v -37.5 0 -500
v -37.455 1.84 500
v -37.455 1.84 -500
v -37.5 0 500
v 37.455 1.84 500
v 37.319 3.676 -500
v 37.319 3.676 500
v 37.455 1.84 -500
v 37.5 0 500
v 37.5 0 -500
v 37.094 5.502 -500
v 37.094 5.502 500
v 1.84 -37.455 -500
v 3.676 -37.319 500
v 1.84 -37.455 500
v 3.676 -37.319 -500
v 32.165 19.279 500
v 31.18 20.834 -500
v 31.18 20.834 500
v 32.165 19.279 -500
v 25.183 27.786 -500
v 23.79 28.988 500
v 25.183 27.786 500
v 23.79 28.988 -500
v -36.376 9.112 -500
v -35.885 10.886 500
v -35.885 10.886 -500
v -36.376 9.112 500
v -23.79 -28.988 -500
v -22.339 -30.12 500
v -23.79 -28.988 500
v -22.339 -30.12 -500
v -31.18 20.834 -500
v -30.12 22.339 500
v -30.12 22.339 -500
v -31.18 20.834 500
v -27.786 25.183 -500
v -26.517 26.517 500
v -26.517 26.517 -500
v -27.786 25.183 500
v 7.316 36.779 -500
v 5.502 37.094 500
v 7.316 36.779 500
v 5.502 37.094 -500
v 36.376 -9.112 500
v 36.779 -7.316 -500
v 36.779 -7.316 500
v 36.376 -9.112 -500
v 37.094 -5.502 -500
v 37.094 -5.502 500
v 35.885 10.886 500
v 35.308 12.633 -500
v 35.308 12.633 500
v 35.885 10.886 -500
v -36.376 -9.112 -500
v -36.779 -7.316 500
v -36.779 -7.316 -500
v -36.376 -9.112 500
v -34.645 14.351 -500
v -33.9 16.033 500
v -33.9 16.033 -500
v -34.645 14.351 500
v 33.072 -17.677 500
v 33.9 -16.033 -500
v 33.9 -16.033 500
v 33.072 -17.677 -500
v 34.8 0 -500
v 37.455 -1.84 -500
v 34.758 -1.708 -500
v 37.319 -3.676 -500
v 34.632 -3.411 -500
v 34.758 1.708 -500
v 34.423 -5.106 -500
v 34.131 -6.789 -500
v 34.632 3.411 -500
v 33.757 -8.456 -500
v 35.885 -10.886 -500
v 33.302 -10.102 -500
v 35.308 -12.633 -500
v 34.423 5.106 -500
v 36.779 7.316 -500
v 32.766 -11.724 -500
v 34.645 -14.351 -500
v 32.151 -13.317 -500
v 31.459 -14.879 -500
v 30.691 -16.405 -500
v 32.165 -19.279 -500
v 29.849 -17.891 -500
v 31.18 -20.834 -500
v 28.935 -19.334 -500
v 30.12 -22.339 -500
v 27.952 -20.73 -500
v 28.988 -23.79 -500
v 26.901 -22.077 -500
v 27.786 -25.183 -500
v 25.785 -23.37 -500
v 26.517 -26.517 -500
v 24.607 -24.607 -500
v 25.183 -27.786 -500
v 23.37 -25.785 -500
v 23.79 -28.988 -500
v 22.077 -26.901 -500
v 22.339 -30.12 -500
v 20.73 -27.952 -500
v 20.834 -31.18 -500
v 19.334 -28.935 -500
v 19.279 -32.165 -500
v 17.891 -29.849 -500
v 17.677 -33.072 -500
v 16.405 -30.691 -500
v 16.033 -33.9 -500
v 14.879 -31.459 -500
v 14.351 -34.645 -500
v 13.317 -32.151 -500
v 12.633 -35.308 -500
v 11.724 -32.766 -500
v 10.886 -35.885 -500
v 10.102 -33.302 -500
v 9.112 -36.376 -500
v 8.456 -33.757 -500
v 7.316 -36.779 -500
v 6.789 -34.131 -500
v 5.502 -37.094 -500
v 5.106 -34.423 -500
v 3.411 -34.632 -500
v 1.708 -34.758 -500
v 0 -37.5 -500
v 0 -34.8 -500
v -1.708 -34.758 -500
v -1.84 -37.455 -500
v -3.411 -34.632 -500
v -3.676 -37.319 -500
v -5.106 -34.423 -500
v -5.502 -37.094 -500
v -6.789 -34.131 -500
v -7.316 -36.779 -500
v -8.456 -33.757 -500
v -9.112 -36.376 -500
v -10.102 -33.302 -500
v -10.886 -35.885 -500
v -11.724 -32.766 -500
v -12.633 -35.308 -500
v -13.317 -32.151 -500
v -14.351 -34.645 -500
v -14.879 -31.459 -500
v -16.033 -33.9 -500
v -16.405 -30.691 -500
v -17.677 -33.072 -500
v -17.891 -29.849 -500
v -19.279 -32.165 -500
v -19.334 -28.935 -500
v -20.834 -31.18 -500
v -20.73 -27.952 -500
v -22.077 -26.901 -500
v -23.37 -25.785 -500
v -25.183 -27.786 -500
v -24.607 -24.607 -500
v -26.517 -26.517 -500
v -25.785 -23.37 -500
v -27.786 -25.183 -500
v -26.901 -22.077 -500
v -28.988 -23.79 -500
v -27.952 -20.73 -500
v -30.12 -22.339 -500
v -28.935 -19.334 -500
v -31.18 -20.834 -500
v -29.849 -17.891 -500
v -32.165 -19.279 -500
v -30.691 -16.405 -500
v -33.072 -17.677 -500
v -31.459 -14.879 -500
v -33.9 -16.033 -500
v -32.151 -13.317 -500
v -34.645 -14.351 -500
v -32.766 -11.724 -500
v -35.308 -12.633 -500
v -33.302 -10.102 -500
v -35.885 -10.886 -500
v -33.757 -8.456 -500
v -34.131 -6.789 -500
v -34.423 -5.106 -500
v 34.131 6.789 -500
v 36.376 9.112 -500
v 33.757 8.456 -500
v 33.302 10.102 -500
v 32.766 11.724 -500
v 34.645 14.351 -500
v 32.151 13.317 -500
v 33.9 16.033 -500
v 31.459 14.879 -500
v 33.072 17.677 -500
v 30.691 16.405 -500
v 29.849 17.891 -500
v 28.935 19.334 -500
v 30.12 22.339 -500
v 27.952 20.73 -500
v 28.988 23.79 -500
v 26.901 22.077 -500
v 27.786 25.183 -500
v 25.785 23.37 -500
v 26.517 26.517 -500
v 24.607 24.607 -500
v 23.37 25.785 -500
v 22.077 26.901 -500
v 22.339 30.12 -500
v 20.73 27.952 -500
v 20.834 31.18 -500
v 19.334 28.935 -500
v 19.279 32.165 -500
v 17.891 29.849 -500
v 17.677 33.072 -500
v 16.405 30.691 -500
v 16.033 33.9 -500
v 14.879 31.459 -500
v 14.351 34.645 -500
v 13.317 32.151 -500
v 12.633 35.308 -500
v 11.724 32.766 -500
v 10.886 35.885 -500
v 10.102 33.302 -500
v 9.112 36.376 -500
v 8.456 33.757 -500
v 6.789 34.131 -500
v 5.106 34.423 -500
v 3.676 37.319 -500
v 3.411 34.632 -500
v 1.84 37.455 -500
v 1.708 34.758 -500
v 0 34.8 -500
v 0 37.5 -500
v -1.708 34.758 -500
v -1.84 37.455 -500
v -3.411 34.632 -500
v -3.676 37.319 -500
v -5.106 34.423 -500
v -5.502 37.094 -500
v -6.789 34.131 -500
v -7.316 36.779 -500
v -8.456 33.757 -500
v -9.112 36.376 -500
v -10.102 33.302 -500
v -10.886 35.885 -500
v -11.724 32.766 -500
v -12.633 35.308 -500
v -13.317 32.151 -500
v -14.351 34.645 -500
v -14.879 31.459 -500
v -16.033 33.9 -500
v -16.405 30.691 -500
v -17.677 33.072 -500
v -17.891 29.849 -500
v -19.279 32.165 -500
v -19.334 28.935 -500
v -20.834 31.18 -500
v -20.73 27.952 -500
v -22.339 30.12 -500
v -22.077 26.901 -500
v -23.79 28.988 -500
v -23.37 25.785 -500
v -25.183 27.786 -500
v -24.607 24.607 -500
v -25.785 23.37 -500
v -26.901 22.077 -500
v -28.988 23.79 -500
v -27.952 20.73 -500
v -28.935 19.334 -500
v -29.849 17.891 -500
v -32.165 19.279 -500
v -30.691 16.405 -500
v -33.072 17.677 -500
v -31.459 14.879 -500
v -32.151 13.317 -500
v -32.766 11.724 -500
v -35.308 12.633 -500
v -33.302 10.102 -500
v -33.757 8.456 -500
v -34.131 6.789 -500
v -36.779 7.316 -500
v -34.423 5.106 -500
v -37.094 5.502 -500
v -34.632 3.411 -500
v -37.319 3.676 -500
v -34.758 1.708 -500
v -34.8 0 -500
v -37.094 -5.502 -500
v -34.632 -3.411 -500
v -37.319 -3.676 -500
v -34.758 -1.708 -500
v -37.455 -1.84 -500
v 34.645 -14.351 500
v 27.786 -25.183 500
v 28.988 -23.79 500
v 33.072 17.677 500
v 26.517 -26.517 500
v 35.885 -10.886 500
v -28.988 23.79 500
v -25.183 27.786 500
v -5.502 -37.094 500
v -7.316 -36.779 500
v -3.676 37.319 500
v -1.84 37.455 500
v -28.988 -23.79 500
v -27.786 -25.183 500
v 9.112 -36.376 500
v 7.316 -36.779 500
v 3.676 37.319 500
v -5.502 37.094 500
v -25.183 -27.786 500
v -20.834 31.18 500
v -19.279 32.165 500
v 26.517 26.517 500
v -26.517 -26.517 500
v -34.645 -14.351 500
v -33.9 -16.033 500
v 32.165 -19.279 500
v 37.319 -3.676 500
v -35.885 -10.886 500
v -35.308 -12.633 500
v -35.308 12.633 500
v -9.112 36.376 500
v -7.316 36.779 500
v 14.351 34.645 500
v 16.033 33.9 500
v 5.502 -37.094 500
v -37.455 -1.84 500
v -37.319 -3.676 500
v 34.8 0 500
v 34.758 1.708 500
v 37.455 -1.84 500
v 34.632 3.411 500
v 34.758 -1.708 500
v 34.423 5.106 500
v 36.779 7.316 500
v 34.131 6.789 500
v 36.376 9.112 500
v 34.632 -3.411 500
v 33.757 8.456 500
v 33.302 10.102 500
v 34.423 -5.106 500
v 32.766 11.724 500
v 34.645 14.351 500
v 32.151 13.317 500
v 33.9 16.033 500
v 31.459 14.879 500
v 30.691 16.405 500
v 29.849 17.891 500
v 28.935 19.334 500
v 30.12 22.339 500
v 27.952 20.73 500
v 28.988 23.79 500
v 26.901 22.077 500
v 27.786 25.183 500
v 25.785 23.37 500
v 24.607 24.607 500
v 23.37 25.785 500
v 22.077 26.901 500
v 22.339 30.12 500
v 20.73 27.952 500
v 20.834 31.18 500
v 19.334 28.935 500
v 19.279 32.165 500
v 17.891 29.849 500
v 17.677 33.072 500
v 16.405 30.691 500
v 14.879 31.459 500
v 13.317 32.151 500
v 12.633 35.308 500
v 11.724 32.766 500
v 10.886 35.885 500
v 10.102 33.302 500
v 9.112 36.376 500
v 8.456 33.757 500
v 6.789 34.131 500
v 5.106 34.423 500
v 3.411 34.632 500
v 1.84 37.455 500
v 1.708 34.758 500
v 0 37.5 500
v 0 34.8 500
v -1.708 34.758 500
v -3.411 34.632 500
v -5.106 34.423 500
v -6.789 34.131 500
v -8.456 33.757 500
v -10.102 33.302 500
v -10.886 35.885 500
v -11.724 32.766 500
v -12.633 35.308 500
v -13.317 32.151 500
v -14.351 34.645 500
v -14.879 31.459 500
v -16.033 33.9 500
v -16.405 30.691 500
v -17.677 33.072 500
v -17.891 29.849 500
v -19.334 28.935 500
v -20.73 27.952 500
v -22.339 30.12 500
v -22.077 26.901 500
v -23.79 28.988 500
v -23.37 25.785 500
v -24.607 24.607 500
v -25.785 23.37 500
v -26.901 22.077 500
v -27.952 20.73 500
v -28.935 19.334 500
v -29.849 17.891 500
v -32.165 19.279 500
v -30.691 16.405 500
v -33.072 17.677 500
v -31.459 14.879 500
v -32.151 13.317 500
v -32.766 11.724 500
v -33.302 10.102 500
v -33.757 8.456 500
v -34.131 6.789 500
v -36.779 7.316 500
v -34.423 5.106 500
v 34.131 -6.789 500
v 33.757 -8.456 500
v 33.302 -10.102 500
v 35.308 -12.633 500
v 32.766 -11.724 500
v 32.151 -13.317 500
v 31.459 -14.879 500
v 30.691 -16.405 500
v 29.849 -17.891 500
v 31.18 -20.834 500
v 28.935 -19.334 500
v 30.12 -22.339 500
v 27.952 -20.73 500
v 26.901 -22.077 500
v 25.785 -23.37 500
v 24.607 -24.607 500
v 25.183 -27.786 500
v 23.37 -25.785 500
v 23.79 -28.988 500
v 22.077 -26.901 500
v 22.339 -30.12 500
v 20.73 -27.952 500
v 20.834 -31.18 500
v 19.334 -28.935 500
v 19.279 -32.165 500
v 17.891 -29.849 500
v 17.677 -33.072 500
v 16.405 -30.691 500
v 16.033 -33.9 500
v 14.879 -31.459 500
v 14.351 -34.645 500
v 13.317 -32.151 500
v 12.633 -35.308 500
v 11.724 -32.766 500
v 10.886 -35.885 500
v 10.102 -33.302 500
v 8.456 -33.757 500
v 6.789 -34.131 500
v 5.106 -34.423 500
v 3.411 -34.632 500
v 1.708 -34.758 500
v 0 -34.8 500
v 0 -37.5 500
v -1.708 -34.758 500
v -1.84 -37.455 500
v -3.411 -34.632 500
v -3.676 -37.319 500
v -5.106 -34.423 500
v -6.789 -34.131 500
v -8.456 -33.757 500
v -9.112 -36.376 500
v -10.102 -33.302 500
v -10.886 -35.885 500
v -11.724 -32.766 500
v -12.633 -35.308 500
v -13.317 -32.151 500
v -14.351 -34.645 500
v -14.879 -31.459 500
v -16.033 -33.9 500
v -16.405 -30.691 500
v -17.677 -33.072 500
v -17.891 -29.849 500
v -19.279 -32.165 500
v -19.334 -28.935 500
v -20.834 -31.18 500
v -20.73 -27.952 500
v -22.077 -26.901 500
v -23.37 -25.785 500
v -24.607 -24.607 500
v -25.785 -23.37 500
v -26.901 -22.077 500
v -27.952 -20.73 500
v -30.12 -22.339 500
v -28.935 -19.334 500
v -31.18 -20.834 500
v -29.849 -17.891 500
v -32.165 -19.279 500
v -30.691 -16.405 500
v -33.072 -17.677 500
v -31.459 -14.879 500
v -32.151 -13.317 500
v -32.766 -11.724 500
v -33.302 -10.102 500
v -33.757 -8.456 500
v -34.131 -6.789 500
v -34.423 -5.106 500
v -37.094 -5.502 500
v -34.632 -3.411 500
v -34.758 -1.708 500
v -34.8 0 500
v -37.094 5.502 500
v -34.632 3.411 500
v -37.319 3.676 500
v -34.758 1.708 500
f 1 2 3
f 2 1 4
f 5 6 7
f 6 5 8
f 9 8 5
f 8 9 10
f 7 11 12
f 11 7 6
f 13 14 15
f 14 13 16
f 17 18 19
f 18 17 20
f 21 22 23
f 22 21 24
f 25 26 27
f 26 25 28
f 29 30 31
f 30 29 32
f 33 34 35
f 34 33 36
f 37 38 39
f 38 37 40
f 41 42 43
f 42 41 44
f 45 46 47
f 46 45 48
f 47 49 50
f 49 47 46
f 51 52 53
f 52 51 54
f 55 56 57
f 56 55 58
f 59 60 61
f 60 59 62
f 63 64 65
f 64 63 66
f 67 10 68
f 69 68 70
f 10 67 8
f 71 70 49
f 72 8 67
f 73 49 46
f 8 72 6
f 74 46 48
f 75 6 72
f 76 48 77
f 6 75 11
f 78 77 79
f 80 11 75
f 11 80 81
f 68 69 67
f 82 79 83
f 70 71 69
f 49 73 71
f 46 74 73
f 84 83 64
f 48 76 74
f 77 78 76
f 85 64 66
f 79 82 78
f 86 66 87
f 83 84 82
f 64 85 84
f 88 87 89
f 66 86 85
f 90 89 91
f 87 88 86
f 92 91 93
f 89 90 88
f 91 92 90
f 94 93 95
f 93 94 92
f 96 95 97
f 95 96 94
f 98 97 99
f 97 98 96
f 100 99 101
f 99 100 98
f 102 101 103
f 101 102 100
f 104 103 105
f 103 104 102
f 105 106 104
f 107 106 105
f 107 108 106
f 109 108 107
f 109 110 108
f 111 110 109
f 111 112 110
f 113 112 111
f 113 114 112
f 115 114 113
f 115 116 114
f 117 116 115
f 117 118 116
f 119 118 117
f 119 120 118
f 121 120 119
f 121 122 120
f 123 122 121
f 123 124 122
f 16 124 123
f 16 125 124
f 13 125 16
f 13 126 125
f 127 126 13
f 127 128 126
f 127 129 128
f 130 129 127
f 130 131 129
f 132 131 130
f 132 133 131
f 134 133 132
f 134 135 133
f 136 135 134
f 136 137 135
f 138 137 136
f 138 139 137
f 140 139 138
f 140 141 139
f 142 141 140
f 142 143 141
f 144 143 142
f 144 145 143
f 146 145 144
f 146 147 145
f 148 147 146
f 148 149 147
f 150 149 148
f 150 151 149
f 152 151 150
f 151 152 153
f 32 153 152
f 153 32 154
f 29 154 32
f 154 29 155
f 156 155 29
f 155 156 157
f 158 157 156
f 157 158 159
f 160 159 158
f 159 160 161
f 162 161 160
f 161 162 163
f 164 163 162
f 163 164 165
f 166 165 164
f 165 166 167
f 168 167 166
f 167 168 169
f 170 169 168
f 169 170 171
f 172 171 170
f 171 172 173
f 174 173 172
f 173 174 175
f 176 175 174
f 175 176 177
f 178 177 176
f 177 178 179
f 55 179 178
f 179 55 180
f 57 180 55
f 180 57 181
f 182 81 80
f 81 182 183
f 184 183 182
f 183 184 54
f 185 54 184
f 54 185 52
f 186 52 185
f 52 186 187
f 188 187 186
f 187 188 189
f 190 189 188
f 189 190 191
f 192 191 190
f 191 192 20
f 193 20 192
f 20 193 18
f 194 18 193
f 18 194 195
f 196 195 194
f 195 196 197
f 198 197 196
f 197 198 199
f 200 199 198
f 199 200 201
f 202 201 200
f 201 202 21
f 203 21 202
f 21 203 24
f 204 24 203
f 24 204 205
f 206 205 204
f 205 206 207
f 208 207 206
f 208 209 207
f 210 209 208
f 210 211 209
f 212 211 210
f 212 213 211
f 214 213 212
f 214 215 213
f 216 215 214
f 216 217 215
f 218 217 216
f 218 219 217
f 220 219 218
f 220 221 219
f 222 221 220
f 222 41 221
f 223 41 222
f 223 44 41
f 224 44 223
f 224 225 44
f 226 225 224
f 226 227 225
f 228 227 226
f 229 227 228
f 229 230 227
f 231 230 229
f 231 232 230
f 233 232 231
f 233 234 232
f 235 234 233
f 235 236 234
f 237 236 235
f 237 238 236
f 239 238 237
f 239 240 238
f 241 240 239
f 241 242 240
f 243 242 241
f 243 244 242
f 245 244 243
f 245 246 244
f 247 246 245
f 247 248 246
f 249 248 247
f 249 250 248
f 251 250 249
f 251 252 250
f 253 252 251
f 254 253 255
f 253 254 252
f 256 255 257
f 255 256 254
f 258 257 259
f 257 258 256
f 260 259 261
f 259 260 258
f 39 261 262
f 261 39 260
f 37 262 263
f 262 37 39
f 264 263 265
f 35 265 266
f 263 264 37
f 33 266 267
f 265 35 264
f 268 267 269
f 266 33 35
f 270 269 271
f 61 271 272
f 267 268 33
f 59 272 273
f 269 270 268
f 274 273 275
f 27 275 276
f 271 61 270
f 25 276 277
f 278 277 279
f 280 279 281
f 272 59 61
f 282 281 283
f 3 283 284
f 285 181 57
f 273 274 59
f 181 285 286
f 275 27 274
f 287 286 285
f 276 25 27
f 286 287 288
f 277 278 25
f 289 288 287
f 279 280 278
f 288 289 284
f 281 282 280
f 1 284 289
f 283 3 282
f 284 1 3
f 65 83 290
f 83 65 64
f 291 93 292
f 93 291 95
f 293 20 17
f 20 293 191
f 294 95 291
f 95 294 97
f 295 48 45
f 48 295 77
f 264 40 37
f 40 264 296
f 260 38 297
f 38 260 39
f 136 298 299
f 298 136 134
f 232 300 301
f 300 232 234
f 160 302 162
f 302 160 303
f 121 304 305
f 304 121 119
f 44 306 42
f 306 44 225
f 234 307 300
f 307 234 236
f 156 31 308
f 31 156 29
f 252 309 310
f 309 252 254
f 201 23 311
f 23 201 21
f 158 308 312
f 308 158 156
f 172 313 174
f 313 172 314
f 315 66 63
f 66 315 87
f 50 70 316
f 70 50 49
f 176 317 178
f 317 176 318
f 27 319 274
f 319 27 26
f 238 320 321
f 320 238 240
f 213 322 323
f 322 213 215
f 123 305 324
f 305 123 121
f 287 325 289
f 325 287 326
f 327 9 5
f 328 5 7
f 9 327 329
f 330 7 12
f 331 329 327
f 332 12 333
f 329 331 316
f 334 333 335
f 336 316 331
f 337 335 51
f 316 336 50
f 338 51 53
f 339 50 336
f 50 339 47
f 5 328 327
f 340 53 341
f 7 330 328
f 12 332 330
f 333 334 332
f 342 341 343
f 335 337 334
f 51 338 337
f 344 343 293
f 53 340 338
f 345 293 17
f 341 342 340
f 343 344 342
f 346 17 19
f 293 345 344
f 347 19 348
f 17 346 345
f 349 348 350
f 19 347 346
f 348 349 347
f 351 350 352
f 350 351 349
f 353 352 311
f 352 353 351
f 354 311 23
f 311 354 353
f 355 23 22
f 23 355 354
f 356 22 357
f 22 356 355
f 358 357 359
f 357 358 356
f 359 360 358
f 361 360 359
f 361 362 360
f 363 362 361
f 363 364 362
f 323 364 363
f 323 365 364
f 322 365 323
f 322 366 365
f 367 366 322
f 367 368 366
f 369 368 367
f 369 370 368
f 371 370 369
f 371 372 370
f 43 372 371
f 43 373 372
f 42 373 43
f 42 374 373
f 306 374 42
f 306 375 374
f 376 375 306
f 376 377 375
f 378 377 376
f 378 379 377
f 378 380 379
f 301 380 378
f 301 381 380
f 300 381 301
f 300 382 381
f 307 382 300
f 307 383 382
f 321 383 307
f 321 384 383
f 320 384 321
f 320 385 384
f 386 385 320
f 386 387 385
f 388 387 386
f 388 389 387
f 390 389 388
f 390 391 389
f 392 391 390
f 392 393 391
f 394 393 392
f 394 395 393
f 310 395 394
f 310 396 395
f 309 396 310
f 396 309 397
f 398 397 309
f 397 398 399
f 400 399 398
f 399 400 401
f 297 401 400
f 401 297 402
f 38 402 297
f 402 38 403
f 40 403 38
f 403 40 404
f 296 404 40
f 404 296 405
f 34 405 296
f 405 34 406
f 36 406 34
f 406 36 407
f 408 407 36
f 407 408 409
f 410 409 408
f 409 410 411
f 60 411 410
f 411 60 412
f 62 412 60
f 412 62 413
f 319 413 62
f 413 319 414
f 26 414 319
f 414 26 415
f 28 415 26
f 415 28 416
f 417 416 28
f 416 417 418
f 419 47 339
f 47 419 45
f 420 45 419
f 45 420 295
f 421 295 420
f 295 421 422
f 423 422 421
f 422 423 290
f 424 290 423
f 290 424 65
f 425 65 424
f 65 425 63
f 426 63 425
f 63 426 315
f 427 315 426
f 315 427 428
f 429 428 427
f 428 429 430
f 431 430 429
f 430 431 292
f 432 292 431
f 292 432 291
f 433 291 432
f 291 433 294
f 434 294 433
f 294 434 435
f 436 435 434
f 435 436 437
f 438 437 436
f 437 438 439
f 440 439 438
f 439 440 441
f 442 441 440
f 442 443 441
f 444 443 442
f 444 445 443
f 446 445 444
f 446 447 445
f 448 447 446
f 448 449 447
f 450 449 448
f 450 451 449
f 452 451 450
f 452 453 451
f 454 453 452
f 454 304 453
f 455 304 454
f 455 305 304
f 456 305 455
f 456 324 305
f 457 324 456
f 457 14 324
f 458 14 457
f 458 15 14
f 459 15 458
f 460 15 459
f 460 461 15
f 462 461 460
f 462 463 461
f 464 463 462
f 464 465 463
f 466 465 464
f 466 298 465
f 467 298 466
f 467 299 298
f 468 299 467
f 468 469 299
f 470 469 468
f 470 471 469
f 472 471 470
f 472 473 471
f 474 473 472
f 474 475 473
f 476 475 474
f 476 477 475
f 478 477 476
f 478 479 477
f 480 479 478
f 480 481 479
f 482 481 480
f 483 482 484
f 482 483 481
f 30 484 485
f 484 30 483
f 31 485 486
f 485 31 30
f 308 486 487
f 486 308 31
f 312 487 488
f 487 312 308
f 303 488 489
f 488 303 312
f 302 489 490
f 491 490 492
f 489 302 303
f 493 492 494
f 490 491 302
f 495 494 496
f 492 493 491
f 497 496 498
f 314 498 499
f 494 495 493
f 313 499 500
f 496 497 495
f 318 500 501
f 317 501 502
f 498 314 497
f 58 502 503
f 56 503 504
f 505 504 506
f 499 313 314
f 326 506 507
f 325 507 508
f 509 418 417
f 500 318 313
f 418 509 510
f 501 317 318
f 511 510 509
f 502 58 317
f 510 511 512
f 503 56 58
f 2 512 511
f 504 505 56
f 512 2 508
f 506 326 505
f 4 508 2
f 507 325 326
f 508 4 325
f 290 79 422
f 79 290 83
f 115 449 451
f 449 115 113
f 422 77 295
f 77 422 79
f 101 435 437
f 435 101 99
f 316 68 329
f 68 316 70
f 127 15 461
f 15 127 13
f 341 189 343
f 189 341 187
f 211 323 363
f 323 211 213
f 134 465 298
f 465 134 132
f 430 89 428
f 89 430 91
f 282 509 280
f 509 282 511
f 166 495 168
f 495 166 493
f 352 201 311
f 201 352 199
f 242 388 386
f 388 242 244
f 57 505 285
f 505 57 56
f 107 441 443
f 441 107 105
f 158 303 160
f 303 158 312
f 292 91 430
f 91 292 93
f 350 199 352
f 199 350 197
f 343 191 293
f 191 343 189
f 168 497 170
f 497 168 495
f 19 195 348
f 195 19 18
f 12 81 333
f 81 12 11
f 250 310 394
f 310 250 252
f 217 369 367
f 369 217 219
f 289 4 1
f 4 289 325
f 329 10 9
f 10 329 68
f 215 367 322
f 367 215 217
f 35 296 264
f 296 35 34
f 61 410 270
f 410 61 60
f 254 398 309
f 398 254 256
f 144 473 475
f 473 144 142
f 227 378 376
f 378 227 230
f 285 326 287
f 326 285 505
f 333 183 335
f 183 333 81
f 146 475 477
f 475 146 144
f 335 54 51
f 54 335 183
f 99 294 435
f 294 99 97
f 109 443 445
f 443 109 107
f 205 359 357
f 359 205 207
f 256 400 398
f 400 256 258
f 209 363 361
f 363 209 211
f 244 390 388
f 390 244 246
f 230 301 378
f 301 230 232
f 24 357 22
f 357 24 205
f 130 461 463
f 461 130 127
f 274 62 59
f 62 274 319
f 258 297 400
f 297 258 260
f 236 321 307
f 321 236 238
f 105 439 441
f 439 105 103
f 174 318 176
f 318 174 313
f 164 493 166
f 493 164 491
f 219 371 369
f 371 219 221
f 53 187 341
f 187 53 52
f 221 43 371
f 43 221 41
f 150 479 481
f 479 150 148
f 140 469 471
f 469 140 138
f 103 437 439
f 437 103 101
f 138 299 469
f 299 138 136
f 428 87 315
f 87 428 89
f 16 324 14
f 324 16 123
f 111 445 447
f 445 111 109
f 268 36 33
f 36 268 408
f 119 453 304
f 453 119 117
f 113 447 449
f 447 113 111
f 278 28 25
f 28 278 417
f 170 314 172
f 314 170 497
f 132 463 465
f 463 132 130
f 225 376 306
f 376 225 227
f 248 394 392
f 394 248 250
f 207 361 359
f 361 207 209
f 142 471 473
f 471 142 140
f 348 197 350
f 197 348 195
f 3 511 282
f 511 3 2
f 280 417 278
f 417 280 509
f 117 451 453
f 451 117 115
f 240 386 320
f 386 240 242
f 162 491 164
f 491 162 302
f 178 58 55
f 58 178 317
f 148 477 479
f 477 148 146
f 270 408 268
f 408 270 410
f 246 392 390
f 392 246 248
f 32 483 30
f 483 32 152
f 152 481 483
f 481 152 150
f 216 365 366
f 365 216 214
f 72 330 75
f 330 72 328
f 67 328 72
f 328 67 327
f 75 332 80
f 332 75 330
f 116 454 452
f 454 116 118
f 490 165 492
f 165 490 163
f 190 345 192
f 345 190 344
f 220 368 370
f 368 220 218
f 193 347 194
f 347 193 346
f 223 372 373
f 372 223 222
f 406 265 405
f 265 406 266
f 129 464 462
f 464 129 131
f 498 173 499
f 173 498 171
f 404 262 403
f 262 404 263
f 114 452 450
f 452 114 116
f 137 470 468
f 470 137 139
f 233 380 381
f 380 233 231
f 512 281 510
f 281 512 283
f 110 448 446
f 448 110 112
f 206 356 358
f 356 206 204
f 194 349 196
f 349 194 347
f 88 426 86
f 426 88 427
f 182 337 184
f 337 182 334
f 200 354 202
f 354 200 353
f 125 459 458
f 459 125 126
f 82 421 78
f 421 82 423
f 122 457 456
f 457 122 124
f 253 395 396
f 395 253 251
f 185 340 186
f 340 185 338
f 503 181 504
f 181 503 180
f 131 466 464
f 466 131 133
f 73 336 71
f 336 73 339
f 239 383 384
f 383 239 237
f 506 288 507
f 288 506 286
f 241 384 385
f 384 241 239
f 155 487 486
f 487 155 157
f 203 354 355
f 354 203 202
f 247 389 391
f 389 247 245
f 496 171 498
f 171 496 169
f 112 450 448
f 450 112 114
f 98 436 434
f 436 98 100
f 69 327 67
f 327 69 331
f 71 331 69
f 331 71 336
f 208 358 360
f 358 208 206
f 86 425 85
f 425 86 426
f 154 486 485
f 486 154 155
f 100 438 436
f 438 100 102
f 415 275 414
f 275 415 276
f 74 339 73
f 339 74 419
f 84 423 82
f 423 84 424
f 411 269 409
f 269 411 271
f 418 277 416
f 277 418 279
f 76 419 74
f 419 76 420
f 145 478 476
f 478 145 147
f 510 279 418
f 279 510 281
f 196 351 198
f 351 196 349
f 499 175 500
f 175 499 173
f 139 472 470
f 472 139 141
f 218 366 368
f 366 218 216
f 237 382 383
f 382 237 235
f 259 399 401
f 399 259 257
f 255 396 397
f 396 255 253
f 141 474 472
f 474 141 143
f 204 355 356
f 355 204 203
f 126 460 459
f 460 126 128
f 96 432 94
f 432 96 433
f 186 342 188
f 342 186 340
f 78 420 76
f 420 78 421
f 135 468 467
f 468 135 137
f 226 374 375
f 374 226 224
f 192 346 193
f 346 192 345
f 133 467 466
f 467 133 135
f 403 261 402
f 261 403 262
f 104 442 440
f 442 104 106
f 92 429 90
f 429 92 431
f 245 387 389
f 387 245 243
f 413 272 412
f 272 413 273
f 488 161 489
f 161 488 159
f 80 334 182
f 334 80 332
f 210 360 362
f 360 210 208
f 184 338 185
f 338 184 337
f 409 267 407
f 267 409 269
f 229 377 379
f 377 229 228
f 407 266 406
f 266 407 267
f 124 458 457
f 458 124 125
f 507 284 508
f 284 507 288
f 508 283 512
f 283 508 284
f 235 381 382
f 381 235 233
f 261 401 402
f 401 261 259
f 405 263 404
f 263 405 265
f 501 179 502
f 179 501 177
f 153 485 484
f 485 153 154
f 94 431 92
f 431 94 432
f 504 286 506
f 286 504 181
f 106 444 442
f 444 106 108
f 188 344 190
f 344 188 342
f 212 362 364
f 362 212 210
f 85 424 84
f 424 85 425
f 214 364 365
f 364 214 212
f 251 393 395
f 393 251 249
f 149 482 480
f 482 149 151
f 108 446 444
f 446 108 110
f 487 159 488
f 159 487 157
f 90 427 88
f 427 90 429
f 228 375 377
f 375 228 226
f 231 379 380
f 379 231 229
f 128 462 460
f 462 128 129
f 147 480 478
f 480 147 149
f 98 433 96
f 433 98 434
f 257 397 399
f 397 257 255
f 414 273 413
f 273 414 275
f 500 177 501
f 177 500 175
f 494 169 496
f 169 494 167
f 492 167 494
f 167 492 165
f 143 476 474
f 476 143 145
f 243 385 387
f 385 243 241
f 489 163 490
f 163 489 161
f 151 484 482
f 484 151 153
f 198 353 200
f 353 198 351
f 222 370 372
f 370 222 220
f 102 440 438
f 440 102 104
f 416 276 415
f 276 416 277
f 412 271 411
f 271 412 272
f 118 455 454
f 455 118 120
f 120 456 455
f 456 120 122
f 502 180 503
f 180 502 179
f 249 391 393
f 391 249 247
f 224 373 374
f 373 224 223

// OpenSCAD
$fn=128;

module ht_pipe(od=75, length=1000, wall=2.7) {
    difference() {
        cylinder(h=length, d=od, center=true);
        cylinder(h=length+2, d=od-2*wall, center=true);
    }
}

ht_pipe(od=75, length=1000, wall=2.7);
